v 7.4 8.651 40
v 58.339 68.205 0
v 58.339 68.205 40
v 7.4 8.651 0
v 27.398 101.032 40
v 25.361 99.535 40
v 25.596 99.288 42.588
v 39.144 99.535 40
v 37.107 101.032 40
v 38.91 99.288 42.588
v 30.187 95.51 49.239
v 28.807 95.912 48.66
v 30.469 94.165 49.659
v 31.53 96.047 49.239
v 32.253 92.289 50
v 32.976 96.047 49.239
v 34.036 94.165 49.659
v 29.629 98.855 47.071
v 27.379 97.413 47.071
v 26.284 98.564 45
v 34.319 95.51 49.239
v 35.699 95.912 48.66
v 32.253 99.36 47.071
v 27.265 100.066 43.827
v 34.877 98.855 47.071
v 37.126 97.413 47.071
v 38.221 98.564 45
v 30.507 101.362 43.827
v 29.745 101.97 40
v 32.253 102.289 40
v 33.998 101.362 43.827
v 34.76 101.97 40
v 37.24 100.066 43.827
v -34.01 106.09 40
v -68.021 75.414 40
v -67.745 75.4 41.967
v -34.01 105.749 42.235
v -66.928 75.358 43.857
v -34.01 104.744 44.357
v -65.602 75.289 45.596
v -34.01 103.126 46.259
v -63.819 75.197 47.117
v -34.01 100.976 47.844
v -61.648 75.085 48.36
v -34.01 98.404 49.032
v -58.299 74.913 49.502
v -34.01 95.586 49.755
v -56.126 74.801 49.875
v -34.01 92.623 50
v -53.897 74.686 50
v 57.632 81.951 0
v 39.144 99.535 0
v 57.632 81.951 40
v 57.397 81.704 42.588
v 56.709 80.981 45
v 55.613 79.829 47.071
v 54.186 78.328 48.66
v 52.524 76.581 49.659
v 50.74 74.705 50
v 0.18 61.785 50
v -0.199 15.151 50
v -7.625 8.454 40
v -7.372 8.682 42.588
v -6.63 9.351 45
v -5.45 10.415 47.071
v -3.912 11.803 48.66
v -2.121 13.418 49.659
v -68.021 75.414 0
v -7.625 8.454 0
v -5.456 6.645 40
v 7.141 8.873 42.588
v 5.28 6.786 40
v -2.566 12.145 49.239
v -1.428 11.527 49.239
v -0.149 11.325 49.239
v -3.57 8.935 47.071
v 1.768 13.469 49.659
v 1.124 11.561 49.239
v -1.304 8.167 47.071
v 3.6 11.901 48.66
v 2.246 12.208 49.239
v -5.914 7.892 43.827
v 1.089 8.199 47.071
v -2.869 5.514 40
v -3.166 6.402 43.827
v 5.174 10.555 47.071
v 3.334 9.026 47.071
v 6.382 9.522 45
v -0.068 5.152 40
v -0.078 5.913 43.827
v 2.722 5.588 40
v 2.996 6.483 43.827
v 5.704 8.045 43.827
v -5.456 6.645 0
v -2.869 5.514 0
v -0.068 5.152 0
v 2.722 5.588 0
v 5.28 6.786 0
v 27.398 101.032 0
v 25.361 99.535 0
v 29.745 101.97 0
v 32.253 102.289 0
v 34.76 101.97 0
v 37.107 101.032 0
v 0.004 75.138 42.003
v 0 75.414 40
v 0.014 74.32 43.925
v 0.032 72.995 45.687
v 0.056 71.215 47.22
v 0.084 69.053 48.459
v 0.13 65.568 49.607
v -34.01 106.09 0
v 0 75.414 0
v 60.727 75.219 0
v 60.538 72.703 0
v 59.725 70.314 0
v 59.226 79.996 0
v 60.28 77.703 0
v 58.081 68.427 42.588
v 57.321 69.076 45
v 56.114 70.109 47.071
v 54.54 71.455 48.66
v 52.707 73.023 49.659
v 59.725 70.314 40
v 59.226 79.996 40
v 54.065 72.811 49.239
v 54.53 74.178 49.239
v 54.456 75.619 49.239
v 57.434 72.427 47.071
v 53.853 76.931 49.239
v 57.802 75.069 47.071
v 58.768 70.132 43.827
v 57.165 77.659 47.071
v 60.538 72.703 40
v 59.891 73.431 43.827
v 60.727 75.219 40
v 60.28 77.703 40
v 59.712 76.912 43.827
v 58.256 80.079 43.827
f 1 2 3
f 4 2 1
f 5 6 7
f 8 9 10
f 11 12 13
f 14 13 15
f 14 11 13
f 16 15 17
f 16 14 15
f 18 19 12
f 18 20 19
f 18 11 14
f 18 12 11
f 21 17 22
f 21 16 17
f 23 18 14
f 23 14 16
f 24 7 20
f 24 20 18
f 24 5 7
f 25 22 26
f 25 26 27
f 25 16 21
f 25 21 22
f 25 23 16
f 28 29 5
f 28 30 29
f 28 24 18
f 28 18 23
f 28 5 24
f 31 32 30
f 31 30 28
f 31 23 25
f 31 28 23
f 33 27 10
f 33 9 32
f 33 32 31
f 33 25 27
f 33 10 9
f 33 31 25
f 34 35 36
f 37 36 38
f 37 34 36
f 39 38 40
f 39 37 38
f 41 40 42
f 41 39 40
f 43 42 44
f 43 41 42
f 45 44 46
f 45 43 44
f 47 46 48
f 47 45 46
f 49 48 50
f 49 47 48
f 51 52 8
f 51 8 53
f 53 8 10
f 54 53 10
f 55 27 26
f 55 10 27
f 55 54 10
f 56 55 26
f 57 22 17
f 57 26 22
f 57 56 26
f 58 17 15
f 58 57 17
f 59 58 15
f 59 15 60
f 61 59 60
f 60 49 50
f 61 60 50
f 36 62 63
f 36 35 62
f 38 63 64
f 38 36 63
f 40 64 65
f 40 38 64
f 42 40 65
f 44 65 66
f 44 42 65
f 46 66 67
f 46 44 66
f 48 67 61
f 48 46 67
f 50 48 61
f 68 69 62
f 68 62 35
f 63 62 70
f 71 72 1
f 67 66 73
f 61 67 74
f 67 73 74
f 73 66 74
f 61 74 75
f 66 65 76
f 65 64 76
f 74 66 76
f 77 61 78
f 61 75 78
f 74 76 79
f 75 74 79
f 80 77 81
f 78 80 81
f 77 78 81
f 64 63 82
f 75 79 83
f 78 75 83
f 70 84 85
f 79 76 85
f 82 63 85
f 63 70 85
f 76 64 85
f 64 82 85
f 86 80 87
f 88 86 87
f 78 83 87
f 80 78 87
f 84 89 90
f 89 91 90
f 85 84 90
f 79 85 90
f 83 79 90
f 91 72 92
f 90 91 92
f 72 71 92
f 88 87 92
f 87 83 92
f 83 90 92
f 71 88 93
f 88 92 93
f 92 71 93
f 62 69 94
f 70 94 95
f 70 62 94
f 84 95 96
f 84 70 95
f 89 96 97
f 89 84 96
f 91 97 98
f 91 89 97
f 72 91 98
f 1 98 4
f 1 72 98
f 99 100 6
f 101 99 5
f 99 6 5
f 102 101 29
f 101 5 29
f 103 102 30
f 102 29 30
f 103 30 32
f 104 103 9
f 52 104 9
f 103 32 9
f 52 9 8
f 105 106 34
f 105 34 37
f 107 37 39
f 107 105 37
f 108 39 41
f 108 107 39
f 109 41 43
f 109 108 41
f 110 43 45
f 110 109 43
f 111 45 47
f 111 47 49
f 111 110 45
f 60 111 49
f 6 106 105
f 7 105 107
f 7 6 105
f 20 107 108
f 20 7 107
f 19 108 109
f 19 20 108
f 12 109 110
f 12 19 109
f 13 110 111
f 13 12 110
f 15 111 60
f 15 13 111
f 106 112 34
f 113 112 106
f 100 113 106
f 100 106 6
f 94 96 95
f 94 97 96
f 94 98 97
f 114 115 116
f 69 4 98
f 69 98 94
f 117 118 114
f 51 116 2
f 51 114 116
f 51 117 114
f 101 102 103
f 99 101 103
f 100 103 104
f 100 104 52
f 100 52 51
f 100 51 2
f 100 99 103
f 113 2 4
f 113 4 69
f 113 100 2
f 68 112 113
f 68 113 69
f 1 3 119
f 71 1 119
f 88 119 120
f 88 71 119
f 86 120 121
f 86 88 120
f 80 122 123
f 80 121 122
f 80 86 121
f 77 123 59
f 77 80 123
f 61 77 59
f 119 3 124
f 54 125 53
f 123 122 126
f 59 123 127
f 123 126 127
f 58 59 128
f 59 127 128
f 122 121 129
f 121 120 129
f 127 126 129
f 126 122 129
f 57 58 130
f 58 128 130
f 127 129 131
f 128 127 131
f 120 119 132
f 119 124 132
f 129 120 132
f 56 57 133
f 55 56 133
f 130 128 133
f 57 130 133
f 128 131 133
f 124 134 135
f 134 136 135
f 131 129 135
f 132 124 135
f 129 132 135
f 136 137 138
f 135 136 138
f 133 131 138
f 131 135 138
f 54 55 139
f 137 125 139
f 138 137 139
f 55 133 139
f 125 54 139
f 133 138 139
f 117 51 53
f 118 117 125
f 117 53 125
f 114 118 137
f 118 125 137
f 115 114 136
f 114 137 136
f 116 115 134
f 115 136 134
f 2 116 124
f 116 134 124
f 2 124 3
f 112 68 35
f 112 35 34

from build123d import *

# Parameters (mm, degrees)
BOSS_EXTRUDE1_DEPTH = 50
FILLET1_R           = 10


with BuildPart() as part:
    # Sketch1 → Boss-Extrude1 (new body)
    with BuildSketch(Plane.XY):
        Polygon((0, 0), (-68.020648891, 75.4139), (-34.010324446, 106.09), (0, 75.4139), (32.252675554, 106.09), (64.505351109, 75.4139), align=None)
    extrude(amount=BOSS_EXTRUDE1_DEPTH)

    # Fillet1
    fillet1_edges = [part.edges().sort_by_distance(p)[0] for p in [
        (0, 0, 25),
        (32.252675554, 106.09, 25),
        (64.505351109, 75.4139, 25),
        (16.126337777, 90.75195, 50),
        (-17.005162223, 90.75195, 50),
        (-51.015486668, 90.75195, 50),
        (-34.010324446, 37.70695, 50),
        (32.252675554, 37.70695, 50),
        (48.379013332, 90.75195, 50),
    ]]
    fillet(fillet1_edges, radius=FILLET1_R)


solid = part.part
